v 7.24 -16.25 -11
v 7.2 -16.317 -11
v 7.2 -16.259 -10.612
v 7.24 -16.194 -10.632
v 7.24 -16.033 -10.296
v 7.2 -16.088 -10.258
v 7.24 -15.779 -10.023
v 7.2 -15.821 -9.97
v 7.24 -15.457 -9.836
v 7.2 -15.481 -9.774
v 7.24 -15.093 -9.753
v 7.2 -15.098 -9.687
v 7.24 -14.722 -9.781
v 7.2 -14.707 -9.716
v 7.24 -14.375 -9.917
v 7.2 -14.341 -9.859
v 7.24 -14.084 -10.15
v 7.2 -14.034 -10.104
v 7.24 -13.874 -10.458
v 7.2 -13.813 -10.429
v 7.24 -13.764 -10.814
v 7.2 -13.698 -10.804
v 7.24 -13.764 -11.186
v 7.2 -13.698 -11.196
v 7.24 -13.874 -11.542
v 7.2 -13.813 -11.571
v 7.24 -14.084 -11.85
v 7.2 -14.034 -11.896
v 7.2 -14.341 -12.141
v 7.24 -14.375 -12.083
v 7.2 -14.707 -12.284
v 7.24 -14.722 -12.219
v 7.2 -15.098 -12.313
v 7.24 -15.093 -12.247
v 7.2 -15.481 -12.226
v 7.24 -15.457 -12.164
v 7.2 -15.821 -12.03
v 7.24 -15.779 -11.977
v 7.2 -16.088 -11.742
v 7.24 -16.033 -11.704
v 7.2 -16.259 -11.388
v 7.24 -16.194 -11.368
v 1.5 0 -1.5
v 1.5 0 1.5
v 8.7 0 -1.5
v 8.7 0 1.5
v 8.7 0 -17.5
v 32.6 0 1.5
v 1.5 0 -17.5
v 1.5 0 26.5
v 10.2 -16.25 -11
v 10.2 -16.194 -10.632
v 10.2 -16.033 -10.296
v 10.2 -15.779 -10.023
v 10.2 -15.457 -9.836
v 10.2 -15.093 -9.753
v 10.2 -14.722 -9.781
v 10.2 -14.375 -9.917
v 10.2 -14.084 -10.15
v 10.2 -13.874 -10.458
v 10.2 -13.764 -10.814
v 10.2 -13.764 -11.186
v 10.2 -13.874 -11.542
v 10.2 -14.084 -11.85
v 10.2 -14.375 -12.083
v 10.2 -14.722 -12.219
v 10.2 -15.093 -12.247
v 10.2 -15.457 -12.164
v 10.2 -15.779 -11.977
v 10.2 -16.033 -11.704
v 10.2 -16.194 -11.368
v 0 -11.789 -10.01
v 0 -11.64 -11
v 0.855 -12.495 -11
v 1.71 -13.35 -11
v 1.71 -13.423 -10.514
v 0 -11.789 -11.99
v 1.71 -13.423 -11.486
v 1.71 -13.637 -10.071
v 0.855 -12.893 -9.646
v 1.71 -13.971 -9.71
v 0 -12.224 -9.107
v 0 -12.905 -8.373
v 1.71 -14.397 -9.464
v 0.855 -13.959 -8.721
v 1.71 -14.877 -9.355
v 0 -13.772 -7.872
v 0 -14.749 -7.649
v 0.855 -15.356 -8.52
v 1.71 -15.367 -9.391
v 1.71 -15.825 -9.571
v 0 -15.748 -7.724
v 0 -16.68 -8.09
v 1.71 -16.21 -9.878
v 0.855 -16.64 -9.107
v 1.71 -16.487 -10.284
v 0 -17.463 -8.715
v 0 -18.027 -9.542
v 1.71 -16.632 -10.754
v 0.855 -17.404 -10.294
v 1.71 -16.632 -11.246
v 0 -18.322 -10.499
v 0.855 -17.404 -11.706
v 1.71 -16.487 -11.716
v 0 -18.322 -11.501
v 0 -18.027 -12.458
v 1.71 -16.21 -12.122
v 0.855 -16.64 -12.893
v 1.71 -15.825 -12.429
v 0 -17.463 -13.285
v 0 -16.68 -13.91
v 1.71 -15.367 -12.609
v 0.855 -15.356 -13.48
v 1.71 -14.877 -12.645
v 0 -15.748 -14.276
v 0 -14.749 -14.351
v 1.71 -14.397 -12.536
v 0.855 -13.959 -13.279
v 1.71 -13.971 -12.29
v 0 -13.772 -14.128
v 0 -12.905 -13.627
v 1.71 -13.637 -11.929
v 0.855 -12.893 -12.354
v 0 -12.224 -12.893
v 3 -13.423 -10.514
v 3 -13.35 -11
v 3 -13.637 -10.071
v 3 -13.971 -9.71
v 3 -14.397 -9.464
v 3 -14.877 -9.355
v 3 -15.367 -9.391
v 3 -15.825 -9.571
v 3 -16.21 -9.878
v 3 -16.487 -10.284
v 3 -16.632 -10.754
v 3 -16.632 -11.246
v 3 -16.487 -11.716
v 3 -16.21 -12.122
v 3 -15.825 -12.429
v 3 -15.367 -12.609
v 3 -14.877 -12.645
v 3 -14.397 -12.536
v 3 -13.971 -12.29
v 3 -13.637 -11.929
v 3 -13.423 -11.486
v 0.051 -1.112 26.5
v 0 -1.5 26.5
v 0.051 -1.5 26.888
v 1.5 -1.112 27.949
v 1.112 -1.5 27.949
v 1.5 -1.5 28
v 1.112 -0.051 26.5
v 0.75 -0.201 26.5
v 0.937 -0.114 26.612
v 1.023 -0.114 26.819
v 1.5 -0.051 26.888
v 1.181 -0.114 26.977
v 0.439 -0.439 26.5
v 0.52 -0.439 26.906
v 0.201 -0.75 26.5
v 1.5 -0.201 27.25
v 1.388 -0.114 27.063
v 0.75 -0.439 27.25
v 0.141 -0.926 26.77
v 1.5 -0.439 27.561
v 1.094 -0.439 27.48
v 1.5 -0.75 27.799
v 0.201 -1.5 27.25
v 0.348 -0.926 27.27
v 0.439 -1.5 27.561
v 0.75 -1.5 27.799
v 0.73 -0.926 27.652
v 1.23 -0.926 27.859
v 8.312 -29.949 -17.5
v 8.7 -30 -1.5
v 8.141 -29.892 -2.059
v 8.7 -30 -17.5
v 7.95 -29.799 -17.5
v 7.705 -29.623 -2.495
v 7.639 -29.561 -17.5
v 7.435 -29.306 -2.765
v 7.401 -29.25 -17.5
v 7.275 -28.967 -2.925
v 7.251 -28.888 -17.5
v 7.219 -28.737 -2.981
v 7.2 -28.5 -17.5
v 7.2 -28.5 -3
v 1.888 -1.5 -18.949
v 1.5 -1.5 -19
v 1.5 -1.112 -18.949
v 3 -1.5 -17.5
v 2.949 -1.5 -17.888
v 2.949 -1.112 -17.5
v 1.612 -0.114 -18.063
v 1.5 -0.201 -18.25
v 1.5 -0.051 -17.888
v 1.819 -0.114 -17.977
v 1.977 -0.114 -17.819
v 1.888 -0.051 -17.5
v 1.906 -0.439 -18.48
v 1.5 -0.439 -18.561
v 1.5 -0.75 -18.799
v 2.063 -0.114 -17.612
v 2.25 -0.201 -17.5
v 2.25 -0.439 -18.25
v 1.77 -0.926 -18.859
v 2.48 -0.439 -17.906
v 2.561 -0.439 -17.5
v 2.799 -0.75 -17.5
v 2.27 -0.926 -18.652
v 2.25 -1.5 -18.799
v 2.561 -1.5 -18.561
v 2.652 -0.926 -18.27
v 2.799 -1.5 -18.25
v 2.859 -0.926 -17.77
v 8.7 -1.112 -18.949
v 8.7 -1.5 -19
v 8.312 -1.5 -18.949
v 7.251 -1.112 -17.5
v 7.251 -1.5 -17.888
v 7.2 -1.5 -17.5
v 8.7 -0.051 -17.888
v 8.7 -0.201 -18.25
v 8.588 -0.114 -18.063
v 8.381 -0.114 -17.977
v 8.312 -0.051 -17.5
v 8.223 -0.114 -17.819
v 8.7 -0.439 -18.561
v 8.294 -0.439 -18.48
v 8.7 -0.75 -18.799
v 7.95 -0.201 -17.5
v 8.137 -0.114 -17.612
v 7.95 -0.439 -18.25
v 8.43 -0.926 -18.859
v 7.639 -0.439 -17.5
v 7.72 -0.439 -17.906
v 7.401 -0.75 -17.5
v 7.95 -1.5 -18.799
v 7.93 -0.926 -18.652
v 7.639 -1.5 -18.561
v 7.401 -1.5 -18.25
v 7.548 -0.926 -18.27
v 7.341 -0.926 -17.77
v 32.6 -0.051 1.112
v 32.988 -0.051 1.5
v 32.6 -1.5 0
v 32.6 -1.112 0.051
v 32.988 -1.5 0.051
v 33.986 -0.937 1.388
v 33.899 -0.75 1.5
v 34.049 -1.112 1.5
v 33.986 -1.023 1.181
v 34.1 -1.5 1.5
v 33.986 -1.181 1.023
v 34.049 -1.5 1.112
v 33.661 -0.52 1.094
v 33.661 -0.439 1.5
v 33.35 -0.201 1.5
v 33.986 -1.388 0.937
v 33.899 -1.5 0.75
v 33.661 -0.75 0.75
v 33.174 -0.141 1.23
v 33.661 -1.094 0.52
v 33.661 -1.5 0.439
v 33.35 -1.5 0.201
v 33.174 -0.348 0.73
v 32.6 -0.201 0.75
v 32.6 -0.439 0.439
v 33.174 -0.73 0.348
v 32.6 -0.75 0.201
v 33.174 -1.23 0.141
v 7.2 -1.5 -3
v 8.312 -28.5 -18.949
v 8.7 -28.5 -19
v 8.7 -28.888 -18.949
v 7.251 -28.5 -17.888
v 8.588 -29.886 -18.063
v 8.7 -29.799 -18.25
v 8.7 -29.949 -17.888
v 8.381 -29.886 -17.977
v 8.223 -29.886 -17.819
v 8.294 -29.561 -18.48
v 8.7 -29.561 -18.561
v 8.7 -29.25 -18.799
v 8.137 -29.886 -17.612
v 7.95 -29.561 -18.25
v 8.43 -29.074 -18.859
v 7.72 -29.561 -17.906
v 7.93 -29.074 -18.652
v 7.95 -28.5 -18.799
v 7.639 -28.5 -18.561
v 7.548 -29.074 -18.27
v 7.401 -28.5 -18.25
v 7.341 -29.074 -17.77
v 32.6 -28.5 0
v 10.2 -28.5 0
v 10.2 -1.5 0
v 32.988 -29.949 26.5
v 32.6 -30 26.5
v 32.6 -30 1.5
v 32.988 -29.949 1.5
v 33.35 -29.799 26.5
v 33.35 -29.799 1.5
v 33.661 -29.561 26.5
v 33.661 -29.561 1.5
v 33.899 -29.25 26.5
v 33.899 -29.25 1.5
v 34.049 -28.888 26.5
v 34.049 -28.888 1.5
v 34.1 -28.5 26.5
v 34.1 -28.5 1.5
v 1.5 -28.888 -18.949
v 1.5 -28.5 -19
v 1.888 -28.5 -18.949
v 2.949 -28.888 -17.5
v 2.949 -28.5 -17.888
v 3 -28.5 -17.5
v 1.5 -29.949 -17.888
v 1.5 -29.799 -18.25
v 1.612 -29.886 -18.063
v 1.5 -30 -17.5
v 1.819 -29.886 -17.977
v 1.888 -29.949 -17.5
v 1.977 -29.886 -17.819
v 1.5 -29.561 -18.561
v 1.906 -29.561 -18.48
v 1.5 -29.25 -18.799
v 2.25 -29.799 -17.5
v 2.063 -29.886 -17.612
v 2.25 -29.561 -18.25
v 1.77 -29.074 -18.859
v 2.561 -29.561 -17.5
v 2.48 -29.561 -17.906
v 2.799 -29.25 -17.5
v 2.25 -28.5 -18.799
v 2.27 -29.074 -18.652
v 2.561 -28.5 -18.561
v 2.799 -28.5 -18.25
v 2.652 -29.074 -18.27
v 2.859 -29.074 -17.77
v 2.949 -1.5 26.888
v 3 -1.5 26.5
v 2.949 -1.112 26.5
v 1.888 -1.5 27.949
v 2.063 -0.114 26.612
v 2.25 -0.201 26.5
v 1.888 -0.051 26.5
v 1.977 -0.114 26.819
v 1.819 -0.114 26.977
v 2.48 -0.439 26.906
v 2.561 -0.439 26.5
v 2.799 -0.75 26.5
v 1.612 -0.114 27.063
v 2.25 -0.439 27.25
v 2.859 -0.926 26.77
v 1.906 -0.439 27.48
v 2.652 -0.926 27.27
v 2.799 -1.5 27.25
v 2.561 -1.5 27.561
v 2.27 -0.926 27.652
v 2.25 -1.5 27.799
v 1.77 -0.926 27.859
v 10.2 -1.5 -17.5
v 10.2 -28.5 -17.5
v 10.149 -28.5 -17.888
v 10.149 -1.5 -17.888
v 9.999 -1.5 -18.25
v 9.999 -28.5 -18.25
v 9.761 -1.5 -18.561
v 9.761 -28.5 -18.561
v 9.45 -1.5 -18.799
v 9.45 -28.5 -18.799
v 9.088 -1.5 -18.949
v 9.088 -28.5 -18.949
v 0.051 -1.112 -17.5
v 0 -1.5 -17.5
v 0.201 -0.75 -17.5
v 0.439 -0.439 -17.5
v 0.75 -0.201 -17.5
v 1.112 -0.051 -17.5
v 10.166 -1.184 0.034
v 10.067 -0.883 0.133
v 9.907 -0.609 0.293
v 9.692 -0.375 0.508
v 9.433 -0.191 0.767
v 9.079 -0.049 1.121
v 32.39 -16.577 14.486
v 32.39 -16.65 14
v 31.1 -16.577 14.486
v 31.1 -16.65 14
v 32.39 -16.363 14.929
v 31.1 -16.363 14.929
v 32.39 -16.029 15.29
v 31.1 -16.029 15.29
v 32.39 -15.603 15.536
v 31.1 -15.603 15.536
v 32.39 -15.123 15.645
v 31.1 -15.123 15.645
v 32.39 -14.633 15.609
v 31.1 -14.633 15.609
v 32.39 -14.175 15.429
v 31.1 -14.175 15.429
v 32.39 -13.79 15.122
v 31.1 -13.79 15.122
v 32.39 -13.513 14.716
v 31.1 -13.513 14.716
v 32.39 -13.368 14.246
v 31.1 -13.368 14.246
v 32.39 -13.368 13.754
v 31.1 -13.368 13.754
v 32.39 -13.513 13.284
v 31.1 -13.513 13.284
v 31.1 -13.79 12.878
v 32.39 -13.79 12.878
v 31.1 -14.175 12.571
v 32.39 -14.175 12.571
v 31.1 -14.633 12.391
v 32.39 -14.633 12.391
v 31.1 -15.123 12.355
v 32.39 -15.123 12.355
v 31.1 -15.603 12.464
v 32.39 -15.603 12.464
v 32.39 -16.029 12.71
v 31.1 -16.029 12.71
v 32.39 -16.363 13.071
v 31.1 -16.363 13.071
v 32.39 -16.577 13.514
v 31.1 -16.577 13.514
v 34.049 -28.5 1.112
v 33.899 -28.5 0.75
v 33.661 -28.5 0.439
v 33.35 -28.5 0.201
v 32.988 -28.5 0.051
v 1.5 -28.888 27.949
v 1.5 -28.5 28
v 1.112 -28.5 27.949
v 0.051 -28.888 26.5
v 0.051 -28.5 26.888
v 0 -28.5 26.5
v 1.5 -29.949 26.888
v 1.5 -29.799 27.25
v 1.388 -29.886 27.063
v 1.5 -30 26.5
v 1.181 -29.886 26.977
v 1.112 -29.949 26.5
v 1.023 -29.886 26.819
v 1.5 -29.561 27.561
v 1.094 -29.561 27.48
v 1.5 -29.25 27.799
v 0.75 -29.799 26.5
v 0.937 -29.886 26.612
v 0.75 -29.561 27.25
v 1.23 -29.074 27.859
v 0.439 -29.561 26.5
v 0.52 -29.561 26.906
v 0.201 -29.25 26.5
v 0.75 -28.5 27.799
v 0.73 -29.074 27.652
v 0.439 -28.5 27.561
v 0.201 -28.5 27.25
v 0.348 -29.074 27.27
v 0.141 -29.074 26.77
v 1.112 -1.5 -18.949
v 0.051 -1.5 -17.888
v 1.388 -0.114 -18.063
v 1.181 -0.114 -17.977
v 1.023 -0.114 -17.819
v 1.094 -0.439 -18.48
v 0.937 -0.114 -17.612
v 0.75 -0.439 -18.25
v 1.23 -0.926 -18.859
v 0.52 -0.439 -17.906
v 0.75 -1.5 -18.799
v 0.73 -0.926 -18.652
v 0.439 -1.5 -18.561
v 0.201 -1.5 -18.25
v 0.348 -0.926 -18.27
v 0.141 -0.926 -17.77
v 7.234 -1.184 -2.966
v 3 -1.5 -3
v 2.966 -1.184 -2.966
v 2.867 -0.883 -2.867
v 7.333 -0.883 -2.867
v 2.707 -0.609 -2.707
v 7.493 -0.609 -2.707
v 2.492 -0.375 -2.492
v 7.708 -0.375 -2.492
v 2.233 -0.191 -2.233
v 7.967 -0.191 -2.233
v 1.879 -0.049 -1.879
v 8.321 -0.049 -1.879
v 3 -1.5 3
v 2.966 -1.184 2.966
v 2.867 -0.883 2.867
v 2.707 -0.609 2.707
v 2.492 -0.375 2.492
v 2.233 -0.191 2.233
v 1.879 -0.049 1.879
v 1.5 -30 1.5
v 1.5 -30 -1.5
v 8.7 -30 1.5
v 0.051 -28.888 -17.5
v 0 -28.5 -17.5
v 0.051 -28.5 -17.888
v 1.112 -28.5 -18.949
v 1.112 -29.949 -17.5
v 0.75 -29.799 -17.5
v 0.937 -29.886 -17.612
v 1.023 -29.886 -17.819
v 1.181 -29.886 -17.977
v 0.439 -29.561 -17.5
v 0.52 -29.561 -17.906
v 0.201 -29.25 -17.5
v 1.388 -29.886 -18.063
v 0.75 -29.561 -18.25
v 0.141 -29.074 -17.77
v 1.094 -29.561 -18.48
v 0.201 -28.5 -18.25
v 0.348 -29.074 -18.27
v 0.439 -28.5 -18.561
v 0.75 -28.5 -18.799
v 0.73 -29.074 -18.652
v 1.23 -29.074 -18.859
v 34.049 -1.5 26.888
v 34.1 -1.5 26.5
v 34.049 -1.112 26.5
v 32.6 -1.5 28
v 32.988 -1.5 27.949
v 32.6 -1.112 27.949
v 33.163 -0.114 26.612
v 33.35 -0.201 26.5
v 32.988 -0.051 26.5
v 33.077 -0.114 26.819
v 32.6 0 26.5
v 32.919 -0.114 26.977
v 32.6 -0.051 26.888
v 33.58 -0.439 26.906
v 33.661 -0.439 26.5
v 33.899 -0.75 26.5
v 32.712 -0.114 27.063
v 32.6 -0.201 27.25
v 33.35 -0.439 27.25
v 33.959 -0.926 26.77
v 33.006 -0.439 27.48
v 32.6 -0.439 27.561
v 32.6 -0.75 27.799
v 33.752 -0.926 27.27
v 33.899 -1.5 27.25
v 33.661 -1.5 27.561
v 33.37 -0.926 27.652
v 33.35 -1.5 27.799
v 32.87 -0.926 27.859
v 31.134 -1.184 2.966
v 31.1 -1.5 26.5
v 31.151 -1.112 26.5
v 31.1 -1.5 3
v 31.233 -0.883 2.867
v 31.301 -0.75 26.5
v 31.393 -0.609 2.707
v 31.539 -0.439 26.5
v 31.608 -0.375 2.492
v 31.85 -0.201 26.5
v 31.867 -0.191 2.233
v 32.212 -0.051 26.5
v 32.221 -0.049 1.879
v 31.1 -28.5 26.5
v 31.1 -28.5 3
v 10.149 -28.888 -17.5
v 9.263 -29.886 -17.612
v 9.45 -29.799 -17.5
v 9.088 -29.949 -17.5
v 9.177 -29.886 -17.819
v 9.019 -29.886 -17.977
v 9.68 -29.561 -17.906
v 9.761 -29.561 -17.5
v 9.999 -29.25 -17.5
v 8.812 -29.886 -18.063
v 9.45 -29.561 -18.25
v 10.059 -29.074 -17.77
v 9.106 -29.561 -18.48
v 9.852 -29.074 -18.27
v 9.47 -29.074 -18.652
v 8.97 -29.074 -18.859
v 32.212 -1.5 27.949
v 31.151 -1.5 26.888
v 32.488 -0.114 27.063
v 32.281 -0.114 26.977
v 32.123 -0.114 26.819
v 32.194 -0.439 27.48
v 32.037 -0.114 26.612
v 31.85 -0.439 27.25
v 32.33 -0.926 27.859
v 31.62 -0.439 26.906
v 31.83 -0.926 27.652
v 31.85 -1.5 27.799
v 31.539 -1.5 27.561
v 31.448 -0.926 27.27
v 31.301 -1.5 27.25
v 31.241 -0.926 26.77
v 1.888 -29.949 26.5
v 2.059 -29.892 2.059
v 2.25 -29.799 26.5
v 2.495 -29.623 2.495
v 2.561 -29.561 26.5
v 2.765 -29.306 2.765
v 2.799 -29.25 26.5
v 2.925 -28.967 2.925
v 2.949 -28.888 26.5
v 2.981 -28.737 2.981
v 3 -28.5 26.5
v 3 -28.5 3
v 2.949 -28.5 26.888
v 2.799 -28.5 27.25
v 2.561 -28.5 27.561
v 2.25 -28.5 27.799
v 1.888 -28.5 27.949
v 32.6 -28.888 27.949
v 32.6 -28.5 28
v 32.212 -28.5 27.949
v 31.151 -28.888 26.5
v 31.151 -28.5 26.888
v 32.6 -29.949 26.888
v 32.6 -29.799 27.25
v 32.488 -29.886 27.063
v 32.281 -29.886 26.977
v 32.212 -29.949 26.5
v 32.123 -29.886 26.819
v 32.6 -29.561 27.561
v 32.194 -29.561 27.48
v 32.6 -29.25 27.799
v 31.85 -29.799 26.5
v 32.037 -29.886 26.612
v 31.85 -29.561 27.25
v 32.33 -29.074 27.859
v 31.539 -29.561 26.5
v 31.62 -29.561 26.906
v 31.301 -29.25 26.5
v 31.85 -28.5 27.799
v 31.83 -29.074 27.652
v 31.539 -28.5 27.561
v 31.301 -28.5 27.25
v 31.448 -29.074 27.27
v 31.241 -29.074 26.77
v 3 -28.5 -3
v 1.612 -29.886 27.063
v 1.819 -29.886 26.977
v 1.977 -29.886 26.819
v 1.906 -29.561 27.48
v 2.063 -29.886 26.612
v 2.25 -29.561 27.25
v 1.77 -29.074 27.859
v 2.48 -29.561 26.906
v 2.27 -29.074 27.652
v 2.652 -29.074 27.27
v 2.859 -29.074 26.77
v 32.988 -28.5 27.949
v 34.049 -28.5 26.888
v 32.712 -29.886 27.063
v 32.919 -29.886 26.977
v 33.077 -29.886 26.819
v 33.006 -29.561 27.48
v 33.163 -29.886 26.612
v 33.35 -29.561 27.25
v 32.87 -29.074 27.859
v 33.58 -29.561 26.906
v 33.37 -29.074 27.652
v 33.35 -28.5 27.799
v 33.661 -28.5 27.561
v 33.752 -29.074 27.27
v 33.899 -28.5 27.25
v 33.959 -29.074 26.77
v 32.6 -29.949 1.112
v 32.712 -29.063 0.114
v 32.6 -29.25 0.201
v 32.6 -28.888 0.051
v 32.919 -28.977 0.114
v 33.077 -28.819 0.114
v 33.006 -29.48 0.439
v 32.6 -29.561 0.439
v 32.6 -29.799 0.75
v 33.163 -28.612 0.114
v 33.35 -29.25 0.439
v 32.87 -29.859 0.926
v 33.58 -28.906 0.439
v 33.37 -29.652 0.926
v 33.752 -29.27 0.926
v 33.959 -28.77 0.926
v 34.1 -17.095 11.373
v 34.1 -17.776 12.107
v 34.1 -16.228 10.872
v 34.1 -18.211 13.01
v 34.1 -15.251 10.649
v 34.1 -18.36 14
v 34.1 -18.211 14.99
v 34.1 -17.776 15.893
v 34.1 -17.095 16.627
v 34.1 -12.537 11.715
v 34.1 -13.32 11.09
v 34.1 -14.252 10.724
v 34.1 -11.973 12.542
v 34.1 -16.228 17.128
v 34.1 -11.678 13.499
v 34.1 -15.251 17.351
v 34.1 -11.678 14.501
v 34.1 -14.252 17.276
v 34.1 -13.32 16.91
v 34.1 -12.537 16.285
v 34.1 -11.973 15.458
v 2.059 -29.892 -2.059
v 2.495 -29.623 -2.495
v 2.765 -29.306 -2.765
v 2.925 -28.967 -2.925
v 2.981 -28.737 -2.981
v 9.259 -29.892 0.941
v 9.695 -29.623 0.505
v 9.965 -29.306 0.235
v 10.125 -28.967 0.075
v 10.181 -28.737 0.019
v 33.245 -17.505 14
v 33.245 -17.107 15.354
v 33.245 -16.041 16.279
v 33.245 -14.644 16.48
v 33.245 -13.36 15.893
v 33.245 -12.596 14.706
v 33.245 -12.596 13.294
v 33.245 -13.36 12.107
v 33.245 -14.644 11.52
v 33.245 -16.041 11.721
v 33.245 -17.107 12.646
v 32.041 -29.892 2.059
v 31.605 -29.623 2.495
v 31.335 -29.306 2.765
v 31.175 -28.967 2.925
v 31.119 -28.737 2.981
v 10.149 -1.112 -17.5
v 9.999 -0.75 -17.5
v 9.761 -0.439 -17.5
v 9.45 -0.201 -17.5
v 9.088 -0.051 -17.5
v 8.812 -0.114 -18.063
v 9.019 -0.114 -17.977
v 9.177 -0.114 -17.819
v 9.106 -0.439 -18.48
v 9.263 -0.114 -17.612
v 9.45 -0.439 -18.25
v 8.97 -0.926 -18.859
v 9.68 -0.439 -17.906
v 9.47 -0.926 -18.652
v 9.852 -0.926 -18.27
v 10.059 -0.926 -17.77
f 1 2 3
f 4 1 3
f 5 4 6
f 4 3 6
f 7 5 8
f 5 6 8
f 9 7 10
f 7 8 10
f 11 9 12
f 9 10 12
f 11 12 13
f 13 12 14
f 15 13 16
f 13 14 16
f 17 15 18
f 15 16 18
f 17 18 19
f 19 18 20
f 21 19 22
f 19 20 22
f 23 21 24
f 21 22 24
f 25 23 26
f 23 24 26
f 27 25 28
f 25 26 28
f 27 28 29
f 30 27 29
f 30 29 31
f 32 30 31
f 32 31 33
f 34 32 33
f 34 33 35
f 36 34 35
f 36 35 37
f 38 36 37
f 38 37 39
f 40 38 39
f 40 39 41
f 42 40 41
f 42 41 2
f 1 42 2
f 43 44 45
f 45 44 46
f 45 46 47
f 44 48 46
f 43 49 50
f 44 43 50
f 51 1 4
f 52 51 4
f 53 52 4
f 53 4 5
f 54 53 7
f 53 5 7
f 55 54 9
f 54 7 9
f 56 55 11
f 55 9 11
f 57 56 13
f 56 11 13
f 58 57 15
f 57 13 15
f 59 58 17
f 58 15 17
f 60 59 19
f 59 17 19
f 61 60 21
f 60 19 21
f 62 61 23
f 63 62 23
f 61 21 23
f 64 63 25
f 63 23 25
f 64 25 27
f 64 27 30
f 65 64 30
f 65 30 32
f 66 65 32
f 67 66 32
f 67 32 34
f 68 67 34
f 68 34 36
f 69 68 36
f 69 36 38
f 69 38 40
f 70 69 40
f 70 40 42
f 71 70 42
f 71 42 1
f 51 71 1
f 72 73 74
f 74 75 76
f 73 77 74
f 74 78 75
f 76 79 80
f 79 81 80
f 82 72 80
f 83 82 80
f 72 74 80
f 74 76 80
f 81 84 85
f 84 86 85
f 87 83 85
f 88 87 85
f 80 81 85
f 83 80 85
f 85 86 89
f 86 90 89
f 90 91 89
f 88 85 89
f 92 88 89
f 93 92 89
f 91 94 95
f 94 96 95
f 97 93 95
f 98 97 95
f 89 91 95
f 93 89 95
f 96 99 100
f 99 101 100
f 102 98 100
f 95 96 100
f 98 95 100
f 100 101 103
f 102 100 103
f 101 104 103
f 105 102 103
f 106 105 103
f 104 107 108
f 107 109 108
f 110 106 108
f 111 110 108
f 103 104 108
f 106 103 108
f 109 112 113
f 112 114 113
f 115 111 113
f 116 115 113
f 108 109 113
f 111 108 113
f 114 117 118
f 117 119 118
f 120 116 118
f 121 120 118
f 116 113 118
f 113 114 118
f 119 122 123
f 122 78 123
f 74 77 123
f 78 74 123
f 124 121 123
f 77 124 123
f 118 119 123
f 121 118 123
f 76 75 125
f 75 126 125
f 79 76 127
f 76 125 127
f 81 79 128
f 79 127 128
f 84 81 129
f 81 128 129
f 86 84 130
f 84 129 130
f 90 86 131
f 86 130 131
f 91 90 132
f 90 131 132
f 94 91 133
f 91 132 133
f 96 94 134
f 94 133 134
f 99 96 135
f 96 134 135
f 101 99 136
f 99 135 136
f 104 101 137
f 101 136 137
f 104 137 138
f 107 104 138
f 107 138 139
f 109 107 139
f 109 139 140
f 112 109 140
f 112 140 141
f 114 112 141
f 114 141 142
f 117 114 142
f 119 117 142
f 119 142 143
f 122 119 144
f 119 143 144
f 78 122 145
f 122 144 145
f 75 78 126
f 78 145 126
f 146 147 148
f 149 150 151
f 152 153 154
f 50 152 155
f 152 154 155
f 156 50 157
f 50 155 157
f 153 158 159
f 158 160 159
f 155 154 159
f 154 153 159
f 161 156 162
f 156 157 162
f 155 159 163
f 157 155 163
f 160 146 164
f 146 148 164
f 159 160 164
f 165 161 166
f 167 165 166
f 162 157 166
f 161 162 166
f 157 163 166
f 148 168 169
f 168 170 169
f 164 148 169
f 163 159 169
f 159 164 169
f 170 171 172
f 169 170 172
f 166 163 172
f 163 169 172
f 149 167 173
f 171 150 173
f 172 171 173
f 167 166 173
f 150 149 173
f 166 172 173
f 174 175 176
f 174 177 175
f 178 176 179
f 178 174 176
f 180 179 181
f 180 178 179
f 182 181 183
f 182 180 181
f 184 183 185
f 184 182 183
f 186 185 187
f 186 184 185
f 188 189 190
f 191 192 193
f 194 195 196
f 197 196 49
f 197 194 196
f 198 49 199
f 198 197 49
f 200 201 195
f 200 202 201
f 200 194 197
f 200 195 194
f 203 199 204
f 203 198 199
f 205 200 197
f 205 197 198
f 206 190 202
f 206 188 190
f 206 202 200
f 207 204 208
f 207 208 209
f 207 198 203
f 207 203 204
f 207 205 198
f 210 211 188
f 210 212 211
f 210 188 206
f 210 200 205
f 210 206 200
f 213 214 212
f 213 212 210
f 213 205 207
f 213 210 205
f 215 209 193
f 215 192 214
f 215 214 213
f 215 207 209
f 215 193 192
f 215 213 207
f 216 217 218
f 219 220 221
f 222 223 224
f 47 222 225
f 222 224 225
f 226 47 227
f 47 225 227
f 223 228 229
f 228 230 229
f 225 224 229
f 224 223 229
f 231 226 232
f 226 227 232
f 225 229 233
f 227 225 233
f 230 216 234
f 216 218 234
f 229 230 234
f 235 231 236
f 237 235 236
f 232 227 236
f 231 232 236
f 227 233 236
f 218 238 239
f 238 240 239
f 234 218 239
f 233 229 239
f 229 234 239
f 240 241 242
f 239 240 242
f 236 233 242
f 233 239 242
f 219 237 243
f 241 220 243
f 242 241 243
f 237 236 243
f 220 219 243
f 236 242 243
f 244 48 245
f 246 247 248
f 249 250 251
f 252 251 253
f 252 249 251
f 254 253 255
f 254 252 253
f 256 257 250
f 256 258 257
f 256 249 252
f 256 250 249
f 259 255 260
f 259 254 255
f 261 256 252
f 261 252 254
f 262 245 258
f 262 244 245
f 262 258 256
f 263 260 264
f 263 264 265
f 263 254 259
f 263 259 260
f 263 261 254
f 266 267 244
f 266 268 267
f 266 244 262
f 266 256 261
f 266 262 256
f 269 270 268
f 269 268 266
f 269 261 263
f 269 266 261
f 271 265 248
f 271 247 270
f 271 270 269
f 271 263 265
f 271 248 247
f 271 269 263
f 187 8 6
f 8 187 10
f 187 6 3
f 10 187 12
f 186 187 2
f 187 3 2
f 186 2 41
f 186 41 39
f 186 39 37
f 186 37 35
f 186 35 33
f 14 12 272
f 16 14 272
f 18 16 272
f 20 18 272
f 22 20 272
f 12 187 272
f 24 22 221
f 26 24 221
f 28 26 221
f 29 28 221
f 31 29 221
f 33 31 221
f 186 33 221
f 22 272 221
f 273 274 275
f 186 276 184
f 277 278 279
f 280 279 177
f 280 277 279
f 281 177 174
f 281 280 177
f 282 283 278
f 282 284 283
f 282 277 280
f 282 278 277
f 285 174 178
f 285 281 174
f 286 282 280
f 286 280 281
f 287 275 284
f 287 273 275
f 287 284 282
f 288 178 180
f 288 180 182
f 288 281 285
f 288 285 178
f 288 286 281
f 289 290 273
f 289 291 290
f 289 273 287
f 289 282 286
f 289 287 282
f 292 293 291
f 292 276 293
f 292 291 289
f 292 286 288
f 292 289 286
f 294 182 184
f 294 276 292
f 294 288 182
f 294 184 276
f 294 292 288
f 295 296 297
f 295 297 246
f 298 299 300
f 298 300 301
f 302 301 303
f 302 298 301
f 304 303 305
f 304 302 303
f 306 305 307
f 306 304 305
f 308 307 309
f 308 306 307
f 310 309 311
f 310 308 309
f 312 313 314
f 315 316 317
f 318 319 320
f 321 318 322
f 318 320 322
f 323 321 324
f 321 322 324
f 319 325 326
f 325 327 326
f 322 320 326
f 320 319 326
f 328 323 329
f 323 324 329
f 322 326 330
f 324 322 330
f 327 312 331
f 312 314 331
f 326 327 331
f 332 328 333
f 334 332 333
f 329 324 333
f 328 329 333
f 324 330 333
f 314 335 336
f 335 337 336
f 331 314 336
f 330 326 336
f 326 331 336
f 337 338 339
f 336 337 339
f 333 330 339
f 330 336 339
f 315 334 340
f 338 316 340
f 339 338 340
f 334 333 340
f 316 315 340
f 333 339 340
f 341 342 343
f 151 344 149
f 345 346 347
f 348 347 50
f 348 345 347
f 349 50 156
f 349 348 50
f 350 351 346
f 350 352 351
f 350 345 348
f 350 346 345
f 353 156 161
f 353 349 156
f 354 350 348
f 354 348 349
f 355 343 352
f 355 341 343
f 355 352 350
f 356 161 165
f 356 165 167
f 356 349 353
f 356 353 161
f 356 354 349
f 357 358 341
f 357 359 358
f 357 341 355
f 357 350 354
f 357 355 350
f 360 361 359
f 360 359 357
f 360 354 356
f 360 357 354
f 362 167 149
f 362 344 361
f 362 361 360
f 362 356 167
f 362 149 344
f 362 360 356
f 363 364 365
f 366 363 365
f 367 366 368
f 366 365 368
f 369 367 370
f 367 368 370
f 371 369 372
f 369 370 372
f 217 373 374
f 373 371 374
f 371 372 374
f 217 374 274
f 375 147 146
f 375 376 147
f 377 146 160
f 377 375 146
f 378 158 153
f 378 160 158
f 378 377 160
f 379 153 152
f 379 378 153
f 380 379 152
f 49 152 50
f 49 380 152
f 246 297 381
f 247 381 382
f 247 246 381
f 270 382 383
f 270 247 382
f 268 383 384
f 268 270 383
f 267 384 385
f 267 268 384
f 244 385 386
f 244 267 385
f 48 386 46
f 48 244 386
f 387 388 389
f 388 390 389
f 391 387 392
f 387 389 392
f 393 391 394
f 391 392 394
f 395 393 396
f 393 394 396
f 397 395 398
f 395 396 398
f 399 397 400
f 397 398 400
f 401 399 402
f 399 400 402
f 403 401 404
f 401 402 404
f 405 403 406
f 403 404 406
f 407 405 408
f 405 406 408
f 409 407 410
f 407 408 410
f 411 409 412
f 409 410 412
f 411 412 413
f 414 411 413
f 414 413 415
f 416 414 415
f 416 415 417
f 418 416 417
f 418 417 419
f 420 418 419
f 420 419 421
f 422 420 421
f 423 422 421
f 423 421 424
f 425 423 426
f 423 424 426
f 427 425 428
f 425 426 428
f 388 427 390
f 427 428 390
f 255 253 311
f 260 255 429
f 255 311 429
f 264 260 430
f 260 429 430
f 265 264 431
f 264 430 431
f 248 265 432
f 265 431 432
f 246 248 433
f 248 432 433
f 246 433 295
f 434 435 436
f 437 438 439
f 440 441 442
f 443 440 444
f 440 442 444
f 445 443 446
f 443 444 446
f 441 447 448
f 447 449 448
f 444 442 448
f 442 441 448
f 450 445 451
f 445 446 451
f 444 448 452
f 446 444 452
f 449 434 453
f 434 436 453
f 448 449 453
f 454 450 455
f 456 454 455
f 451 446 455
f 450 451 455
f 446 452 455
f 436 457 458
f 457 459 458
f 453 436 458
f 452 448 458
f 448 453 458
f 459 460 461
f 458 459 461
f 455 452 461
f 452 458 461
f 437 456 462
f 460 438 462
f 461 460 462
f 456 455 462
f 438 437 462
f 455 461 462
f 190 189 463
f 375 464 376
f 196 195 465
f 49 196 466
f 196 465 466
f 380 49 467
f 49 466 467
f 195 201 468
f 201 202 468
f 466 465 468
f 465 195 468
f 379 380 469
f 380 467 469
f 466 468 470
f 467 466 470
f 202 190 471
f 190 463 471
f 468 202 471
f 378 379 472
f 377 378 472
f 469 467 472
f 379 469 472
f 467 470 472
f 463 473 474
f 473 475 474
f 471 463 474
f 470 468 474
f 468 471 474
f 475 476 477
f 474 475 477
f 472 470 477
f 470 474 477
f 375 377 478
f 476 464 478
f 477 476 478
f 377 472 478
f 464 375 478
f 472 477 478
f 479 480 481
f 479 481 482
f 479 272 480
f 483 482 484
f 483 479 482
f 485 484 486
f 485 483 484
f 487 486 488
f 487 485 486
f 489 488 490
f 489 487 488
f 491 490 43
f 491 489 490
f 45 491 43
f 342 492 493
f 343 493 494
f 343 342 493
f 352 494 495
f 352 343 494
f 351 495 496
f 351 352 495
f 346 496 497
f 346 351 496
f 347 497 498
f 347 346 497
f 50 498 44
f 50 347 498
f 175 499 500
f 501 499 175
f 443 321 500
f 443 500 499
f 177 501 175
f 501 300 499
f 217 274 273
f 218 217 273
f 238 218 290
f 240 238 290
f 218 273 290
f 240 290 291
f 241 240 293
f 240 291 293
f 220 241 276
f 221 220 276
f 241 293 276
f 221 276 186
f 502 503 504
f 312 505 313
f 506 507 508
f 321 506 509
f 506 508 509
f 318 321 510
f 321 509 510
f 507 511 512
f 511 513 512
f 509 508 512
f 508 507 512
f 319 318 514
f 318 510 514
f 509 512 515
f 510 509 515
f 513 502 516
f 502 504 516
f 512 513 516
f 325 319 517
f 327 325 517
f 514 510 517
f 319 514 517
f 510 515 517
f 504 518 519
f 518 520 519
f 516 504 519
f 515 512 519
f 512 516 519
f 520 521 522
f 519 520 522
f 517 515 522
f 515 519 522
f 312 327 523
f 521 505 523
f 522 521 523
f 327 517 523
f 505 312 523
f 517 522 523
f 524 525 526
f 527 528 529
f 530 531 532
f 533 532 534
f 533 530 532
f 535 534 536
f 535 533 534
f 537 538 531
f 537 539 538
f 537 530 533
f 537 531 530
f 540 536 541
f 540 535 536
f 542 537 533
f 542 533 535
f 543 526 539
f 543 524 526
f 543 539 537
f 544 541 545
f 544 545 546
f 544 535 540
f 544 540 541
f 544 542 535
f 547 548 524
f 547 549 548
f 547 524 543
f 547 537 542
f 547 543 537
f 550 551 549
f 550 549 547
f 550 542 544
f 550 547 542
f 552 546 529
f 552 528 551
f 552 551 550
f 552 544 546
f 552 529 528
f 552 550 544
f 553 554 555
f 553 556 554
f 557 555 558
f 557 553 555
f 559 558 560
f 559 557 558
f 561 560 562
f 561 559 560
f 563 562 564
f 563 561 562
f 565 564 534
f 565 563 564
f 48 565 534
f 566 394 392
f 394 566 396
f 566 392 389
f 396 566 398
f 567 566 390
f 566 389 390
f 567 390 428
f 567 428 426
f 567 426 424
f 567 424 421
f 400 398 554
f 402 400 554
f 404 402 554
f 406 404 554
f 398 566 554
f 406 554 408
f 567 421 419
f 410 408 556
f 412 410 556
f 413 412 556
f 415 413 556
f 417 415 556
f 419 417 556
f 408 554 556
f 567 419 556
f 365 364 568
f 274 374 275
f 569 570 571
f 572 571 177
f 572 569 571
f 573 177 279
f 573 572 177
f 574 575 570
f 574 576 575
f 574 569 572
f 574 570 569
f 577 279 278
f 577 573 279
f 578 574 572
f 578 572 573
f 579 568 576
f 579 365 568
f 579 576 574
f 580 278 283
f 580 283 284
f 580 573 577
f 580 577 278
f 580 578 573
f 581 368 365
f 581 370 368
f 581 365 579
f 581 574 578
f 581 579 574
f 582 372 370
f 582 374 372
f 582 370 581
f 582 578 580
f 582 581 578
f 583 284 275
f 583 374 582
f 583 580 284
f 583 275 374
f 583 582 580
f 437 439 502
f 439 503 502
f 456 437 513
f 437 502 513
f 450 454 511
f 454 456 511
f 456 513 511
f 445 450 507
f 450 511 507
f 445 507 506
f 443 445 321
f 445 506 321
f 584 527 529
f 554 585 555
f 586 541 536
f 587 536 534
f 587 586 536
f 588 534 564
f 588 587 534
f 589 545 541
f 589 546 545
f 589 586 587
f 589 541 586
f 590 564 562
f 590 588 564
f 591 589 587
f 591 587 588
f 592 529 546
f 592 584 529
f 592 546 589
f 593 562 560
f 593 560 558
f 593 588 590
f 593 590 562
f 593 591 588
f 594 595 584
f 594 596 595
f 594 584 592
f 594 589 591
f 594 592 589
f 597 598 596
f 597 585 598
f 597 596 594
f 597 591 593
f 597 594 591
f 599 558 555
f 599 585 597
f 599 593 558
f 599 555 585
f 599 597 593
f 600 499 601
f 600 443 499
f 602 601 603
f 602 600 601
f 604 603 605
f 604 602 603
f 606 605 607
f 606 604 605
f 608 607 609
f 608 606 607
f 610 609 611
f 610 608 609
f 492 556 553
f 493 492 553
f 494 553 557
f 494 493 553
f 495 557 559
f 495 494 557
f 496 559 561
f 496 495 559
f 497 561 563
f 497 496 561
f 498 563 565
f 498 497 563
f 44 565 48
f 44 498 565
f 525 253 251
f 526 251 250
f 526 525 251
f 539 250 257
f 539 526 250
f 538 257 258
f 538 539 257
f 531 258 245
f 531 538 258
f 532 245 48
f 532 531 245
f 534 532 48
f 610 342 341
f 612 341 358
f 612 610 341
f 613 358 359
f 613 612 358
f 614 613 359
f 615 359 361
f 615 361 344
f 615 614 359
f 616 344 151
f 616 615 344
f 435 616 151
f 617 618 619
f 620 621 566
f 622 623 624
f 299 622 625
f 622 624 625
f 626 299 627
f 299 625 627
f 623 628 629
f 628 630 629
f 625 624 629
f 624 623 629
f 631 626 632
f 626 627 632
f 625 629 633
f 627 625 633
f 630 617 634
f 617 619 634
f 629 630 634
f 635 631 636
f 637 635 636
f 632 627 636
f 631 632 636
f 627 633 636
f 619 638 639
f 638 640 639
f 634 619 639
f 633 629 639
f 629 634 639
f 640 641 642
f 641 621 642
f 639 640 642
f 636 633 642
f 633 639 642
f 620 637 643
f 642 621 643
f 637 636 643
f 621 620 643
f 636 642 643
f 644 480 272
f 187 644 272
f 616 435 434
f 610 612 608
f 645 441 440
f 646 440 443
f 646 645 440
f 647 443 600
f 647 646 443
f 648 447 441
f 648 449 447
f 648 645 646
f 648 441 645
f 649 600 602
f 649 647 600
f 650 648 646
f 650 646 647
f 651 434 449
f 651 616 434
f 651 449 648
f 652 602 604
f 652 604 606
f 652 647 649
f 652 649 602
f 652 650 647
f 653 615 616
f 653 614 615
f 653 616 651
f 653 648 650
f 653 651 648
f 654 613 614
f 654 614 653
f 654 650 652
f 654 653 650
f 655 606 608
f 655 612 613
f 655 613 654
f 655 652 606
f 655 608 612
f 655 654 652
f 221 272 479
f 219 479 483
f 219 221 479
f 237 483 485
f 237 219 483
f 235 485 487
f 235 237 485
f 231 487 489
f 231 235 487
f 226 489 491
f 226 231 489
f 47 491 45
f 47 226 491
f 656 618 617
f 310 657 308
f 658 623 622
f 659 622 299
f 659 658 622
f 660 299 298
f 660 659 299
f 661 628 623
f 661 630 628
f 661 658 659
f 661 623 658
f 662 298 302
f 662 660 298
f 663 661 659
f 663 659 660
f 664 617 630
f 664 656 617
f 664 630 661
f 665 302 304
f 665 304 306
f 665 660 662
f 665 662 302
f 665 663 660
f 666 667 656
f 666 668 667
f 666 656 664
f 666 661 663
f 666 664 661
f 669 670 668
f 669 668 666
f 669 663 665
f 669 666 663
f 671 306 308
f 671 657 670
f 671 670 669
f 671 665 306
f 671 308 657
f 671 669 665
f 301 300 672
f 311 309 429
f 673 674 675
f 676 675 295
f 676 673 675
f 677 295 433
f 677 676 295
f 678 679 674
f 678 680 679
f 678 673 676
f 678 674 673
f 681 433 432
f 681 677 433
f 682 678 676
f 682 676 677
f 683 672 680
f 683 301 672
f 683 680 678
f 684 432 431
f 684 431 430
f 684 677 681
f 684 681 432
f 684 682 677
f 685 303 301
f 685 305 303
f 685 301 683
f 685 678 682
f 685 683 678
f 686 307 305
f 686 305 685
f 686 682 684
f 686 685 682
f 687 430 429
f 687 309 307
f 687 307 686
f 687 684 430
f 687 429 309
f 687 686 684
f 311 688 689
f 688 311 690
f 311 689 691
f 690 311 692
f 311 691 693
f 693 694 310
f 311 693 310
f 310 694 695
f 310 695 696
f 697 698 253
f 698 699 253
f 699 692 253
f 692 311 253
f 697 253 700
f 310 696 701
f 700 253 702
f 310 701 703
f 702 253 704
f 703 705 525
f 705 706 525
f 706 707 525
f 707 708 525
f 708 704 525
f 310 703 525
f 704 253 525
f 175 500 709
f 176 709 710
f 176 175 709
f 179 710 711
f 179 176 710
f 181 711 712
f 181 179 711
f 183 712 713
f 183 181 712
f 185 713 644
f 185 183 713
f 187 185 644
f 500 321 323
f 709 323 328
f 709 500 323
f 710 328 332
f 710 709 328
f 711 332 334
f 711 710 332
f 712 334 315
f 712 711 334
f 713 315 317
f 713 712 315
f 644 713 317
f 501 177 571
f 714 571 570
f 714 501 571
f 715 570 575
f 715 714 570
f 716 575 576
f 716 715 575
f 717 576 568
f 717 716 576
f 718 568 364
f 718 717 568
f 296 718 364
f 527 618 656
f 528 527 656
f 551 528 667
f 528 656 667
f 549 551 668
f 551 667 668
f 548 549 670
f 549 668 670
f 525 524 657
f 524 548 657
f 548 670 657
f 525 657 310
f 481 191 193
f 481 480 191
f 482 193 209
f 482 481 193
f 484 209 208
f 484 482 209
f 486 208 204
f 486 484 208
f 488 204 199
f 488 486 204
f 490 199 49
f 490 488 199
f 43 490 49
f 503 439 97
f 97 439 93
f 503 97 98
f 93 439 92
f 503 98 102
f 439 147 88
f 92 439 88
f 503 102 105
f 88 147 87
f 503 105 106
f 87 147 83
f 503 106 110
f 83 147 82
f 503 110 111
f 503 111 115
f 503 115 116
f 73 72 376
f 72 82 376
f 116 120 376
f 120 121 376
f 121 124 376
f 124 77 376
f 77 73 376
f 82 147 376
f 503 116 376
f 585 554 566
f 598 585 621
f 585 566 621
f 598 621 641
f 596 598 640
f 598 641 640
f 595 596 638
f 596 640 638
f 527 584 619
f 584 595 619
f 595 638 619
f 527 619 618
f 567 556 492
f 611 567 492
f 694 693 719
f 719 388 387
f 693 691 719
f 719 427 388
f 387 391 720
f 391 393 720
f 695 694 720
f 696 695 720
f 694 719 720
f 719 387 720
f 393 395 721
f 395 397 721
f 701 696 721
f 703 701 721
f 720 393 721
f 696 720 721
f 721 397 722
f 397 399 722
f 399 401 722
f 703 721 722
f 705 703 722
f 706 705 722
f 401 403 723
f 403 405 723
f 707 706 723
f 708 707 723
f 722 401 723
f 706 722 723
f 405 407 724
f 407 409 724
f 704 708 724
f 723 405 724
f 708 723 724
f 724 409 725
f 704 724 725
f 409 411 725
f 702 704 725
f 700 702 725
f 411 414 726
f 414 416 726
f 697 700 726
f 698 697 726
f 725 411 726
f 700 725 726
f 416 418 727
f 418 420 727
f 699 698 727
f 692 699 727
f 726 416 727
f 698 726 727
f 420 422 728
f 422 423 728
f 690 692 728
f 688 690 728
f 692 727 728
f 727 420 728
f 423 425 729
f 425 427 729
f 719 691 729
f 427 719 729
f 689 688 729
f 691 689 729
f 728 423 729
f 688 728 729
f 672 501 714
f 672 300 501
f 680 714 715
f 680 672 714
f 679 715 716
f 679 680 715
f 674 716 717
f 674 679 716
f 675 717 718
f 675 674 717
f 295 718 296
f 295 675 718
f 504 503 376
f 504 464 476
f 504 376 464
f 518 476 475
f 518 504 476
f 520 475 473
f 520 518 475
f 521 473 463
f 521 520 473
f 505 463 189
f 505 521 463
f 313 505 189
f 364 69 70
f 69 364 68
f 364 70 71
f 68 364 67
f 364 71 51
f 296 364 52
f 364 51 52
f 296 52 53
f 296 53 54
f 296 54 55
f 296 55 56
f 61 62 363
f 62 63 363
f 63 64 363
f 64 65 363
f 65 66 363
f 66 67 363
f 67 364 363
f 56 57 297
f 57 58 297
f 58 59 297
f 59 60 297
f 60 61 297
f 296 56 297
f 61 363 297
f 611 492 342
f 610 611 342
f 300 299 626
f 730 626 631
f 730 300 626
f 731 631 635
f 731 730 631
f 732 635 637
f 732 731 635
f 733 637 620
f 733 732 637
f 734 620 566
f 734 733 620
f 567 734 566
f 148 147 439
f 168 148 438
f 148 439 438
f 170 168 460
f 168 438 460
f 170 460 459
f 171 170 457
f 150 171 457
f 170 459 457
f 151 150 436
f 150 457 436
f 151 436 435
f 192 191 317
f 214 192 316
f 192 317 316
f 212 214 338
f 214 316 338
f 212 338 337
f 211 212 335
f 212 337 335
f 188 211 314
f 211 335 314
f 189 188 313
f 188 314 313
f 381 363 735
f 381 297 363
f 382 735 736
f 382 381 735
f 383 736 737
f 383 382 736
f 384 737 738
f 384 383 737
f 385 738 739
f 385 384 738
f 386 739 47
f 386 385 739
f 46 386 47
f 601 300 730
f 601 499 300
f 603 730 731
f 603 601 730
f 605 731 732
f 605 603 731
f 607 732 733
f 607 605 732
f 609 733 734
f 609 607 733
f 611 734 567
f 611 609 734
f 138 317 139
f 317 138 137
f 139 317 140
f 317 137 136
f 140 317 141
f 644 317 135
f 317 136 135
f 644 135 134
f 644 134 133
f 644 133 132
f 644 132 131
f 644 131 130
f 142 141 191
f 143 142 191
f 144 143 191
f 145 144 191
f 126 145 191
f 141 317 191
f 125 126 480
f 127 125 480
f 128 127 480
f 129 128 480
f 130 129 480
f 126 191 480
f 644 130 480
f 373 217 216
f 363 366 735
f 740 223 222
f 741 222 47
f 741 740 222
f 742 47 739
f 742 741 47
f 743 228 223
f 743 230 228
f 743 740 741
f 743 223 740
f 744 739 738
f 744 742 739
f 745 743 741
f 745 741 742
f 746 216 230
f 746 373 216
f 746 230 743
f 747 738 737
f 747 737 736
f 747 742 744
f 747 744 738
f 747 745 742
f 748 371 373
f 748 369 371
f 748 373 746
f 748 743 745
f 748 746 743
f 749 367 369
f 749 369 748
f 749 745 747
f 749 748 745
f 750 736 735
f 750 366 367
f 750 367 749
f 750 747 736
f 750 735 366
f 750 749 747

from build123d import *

# Parameters (mm, degrees)
F1_DEPTH       = 30
F3_D           = 3.3
F3_DEPTH       = 13.5
F3_CSINK_D     = 6.72
F3_CSINK_ANGLE = 90
F3_TIP         = 0.9914200214
F4_R           = 1.49999
F6_D           = 3.3
F6_DEPTH       = 7
F6_CSINK_D     = 6.72
F6_CSINK_ANGLE = 90
F6_TIP         = 0.9914200214
F8_D           = 2.5
F8_DEPTH       = 7
F8_TIP         = 0.7510757738


# Not quite as in the source:
# - a fillet or chamfer is up to 0.001 mm smaller than in the source, because OpenCascade refuses the exact size


with BuildPart() as f1:
    # F0 (on Front) → F1 (new body)
    with BuildSketch(Plane.XZ):
        Polygon((0, 28), (0, 0), (0, -19), (3, -19), (3, -3), (7.2, -3), (7.2, -19), (10.2, -19), (10.2, 0), (34.1, 0), (34.1, 28), (31.1, 28), (31.1, 3), (3, 3), (3, 28), align=None)
    extrude(amount=F1_DEPTH)

    # F3
    with Locations(Plane.YZ.offset(34.1)):
        with Locations((-15, 14)):
            CounterSinkHole(F3_D / 2, F3_CSINK_D / 2, depth=F3_DEPTH, counter_sink_angle=F3_CSINK_ANGLE)
            with Locations((0, 0, -(F3_DEPTH + F3_TIP / 2))):  # 118° drill point
                Cone(0, F3_D / 2, F3_TIP, mode=Mode.SUBTRACT)

    # F4 (radius 1.5 in the source; OpenCascade refuses exactly that, so slightly less here)
    f4_edges = [f1.edges().sort_by_distance(p)[0] for p in [
        (0, -15, -19),
        (3, -15, -19),
        (7.2, -15, -19),
        (10.2, -15, -19),
        (31.1, -15, 28),
        (34.1, -15, 28),
        (3, -15, 28),
        (0, -15, 28),
        (1.5, -30, 28),
        (32.6, -30, 28),
        (31.1, -30, 15.5),
        (34.1, -30, 14),
        (3, -30, 15.5),
        (0, -30, 4.5),
        (17.05, -30, 3),
        (22.15, -30, 0),
        (10.2, -30, -9.5),
        (1.5, -30, -19),
        (8.7, -30, -19),
        (1.5, 0, -19),
        (8.7, 0, -19),
        (0, 0, 4.5),
        (3, 0, -11),
        (7.2, 0, -11),
        (10.2, 0, -9.5),
        (17.05, 0, 3),
        (3, 0, 15.5),
        (22.15, 0, 0),
        (34.1, 0, 14),
        (34.1, -15, 0),
        (5.1, 0, -3),
        (5.1, -30, -3),
        (32.6, 0, 28),
        (1.5, 0, 28),
        (31.1, 0, 15.5),
        (3, -30, -11),
        (7.2, -30, -11),
    ]]
    fillet(f4_edges, radius=F4_R)

    # F6
    with Locations(Plane(origin=(0, 0, 0), x_dir=(0, -1, 0), z_dir=(-1, 0, 0))):
        with Locations((15, -11)):
            CounterSinkHole(F6_D / 2, F6_CSINK_D / 2, depth=F6_DEPTH, counter_sink_angle=F6_CSINK_ANGLE)
            with Locations((0, 0, -(F6_DEPTH + F6_TIP / 2))):  # 118° drill point
                Cone(0, F6_D / 2, F6_TIP, mode=Mode.SUBTRACT)

    # F8
    with Locations(Plane.YZ.offset(10.2)):
        with Locations((-15, -11)):
            Hole(F8_D / 2, depth=F8_DEPTH)
            with Locations((0, 0, -(F8_DEPTH + F8_TIP / 2))):  # 118° drill point
                Cone(0, F8_D / 2, F8_TIP, mode=Mode.SUBTRACT)


solid = f1.part
